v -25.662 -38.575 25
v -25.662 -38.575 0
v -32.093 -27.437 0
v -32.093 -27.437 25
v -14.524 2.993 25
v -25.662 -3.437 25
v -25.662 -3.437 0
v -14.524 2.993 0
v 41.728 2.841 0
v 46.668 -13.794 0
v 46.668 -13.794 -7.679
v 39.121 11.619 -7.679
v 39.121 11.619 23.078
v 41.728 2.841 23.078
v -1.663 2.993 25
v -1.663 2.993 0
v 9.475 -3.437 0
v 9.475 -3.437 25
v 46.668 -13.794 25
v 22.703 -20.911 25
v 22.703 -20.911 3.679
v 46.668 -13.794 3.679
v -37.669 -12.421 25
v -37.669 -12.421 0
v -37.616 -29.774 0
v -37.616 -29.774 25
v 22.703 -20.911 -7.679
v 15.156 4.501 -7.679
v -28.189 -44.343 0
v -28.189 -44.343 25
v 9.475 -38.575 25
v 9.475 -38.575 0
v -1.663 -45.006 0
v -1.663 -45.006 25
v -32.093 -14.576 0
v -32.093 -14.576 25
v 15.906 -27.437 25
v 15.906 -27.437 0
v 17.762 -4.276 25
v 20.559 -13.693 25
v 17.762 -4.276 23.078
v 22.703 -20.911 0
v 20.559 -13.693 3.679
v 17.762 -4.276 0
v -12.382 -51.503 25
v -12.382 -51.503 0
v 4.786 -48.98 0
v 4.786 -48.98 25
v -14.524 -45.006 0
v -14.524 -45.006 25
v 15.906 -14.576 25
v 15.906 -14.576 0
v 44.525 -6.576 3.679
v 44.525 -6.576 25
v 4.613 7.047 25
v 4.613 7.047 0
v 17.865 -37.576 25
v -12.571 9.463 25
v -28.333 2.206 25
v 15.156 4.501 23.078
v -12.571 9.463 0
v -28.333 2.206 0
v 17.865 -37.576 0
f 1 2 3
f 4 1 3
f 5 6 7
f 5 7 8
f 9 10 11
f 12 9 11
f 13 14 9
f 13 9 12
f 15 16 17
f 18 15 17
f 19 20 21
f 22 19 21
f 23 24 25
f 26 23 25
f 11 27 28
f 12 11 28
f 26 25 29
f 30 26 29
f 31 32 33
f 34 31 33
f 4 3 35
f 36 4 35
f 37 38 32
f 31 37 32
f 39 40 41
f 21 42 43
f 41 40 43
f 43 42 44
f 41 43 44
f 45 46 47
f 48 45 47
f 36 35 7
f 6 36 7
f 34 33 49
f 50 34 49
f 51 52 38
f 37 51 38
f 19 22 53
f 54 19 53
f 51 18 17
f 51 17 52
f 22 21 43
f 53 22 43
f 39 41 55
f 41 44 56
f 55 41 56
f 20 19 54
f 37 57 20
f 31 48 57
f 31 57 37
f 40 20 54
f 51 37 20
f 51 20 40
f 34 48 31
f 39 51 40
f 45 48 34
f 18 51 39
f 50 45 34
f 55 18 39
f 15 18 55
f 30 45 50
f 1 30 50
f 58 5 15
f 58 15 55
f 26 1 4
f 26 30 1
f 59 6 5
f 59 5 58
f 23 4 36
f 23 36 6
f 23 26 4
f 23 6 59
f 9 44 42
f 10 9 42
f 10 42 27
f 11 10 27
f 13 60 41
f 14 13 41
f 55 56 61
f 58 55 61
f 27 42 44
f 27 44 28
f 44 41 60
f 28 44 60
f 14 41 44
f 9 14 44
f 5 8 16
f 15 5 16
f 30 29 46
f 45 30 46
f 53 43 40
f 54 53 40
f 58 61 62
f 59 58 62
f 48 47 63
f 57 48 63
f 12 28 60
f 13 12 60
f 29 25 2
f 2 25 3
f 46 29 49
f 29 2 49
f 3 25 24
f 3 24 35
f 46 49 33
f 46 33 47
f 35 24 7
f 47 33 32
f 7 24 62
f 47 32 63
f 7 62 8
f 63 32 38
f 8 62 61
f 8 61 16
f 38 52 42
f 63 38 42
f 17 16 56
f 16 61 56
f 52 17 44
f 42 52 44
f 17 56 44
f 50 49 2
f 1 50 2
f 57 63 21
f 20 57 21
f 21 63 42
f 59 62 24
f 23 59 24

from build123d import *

# Parameters (mm, degrees)
F1_DEPTH = 25
F2_W     = 7.5292935522
F2_H     = 1.9215937704
F3_DEPTH = 25


with BuildPart() as f1:
    # F0 (on Top) → F1 (new body)
    with BuildSketch(Plane.XY):
        Polygon((22.7027747296, -20.9109676407), (17.7624833322, -4.2763235642), (4.6130781694, 7.0467063529), (-12.570597529, 9.4631401168), (-28.3328481427, 2.205777081), (-37.6692704726, -12.4212212686), (-37.615616397, -29.7738863054), (-28.1889207058, -44.3428694885), (-12.3820926751, -51.5026215965), (4.7863114811, -48.9799719237), (17.8654447493, -37.575843917), align=None)
        Polygon((9.4752828792, -38.5750406623), (-1.6629225776, -45.0056865811), (-14.5242144152, -45.0056865811), (-25.662419872, -38.5750406623), (-32.0930657908, -27.4368352055), (-32.0930657908, -14.5755433679), (-25.662419872, -3.4373379111), (-14.5242144152, 2.9933080077), (-1.6629225776, 2.9933080077), (9.4752828792, -3.4373379111), (15.905928798, -14.5755433679), (15.905928798, -27.4368352055), align=None, mode=Mode.SUBTRACT)
    extrude(amount=F1_DEPTH)

    # F2 (on face) → F3 (join)
    with BuildSketch(Plane(origin=(15.1557037318, 4.5010637092, 0), x_dir=(-0.284697928, 0.9586172801, 0), z_dir=(0.9586172801, 0.284697928, 0))):
        Polygon((-18.9797542989, 23.0784062296), (-26.5090478511, 23.0784062296), (-26.5090478511, 12.5), (-26.5090478511, 3.6788478028), (-18.9797542989, 3.6788478028), align=None)
        Polygon((0, 23.0784062296), (-9.1562998658, 23.0784062296), (-9.1562998658, 0), (-26.5090478511, 0), (-26.5090478511, -7.6790573075), (0, -7.6790573075), align=None)
        with Locations((-22.744401075, 24.0392031148)):
            Rectangle(F2_W, F2_H)
    extrude(amount=F3_DEPTH)


solid = f1.part
